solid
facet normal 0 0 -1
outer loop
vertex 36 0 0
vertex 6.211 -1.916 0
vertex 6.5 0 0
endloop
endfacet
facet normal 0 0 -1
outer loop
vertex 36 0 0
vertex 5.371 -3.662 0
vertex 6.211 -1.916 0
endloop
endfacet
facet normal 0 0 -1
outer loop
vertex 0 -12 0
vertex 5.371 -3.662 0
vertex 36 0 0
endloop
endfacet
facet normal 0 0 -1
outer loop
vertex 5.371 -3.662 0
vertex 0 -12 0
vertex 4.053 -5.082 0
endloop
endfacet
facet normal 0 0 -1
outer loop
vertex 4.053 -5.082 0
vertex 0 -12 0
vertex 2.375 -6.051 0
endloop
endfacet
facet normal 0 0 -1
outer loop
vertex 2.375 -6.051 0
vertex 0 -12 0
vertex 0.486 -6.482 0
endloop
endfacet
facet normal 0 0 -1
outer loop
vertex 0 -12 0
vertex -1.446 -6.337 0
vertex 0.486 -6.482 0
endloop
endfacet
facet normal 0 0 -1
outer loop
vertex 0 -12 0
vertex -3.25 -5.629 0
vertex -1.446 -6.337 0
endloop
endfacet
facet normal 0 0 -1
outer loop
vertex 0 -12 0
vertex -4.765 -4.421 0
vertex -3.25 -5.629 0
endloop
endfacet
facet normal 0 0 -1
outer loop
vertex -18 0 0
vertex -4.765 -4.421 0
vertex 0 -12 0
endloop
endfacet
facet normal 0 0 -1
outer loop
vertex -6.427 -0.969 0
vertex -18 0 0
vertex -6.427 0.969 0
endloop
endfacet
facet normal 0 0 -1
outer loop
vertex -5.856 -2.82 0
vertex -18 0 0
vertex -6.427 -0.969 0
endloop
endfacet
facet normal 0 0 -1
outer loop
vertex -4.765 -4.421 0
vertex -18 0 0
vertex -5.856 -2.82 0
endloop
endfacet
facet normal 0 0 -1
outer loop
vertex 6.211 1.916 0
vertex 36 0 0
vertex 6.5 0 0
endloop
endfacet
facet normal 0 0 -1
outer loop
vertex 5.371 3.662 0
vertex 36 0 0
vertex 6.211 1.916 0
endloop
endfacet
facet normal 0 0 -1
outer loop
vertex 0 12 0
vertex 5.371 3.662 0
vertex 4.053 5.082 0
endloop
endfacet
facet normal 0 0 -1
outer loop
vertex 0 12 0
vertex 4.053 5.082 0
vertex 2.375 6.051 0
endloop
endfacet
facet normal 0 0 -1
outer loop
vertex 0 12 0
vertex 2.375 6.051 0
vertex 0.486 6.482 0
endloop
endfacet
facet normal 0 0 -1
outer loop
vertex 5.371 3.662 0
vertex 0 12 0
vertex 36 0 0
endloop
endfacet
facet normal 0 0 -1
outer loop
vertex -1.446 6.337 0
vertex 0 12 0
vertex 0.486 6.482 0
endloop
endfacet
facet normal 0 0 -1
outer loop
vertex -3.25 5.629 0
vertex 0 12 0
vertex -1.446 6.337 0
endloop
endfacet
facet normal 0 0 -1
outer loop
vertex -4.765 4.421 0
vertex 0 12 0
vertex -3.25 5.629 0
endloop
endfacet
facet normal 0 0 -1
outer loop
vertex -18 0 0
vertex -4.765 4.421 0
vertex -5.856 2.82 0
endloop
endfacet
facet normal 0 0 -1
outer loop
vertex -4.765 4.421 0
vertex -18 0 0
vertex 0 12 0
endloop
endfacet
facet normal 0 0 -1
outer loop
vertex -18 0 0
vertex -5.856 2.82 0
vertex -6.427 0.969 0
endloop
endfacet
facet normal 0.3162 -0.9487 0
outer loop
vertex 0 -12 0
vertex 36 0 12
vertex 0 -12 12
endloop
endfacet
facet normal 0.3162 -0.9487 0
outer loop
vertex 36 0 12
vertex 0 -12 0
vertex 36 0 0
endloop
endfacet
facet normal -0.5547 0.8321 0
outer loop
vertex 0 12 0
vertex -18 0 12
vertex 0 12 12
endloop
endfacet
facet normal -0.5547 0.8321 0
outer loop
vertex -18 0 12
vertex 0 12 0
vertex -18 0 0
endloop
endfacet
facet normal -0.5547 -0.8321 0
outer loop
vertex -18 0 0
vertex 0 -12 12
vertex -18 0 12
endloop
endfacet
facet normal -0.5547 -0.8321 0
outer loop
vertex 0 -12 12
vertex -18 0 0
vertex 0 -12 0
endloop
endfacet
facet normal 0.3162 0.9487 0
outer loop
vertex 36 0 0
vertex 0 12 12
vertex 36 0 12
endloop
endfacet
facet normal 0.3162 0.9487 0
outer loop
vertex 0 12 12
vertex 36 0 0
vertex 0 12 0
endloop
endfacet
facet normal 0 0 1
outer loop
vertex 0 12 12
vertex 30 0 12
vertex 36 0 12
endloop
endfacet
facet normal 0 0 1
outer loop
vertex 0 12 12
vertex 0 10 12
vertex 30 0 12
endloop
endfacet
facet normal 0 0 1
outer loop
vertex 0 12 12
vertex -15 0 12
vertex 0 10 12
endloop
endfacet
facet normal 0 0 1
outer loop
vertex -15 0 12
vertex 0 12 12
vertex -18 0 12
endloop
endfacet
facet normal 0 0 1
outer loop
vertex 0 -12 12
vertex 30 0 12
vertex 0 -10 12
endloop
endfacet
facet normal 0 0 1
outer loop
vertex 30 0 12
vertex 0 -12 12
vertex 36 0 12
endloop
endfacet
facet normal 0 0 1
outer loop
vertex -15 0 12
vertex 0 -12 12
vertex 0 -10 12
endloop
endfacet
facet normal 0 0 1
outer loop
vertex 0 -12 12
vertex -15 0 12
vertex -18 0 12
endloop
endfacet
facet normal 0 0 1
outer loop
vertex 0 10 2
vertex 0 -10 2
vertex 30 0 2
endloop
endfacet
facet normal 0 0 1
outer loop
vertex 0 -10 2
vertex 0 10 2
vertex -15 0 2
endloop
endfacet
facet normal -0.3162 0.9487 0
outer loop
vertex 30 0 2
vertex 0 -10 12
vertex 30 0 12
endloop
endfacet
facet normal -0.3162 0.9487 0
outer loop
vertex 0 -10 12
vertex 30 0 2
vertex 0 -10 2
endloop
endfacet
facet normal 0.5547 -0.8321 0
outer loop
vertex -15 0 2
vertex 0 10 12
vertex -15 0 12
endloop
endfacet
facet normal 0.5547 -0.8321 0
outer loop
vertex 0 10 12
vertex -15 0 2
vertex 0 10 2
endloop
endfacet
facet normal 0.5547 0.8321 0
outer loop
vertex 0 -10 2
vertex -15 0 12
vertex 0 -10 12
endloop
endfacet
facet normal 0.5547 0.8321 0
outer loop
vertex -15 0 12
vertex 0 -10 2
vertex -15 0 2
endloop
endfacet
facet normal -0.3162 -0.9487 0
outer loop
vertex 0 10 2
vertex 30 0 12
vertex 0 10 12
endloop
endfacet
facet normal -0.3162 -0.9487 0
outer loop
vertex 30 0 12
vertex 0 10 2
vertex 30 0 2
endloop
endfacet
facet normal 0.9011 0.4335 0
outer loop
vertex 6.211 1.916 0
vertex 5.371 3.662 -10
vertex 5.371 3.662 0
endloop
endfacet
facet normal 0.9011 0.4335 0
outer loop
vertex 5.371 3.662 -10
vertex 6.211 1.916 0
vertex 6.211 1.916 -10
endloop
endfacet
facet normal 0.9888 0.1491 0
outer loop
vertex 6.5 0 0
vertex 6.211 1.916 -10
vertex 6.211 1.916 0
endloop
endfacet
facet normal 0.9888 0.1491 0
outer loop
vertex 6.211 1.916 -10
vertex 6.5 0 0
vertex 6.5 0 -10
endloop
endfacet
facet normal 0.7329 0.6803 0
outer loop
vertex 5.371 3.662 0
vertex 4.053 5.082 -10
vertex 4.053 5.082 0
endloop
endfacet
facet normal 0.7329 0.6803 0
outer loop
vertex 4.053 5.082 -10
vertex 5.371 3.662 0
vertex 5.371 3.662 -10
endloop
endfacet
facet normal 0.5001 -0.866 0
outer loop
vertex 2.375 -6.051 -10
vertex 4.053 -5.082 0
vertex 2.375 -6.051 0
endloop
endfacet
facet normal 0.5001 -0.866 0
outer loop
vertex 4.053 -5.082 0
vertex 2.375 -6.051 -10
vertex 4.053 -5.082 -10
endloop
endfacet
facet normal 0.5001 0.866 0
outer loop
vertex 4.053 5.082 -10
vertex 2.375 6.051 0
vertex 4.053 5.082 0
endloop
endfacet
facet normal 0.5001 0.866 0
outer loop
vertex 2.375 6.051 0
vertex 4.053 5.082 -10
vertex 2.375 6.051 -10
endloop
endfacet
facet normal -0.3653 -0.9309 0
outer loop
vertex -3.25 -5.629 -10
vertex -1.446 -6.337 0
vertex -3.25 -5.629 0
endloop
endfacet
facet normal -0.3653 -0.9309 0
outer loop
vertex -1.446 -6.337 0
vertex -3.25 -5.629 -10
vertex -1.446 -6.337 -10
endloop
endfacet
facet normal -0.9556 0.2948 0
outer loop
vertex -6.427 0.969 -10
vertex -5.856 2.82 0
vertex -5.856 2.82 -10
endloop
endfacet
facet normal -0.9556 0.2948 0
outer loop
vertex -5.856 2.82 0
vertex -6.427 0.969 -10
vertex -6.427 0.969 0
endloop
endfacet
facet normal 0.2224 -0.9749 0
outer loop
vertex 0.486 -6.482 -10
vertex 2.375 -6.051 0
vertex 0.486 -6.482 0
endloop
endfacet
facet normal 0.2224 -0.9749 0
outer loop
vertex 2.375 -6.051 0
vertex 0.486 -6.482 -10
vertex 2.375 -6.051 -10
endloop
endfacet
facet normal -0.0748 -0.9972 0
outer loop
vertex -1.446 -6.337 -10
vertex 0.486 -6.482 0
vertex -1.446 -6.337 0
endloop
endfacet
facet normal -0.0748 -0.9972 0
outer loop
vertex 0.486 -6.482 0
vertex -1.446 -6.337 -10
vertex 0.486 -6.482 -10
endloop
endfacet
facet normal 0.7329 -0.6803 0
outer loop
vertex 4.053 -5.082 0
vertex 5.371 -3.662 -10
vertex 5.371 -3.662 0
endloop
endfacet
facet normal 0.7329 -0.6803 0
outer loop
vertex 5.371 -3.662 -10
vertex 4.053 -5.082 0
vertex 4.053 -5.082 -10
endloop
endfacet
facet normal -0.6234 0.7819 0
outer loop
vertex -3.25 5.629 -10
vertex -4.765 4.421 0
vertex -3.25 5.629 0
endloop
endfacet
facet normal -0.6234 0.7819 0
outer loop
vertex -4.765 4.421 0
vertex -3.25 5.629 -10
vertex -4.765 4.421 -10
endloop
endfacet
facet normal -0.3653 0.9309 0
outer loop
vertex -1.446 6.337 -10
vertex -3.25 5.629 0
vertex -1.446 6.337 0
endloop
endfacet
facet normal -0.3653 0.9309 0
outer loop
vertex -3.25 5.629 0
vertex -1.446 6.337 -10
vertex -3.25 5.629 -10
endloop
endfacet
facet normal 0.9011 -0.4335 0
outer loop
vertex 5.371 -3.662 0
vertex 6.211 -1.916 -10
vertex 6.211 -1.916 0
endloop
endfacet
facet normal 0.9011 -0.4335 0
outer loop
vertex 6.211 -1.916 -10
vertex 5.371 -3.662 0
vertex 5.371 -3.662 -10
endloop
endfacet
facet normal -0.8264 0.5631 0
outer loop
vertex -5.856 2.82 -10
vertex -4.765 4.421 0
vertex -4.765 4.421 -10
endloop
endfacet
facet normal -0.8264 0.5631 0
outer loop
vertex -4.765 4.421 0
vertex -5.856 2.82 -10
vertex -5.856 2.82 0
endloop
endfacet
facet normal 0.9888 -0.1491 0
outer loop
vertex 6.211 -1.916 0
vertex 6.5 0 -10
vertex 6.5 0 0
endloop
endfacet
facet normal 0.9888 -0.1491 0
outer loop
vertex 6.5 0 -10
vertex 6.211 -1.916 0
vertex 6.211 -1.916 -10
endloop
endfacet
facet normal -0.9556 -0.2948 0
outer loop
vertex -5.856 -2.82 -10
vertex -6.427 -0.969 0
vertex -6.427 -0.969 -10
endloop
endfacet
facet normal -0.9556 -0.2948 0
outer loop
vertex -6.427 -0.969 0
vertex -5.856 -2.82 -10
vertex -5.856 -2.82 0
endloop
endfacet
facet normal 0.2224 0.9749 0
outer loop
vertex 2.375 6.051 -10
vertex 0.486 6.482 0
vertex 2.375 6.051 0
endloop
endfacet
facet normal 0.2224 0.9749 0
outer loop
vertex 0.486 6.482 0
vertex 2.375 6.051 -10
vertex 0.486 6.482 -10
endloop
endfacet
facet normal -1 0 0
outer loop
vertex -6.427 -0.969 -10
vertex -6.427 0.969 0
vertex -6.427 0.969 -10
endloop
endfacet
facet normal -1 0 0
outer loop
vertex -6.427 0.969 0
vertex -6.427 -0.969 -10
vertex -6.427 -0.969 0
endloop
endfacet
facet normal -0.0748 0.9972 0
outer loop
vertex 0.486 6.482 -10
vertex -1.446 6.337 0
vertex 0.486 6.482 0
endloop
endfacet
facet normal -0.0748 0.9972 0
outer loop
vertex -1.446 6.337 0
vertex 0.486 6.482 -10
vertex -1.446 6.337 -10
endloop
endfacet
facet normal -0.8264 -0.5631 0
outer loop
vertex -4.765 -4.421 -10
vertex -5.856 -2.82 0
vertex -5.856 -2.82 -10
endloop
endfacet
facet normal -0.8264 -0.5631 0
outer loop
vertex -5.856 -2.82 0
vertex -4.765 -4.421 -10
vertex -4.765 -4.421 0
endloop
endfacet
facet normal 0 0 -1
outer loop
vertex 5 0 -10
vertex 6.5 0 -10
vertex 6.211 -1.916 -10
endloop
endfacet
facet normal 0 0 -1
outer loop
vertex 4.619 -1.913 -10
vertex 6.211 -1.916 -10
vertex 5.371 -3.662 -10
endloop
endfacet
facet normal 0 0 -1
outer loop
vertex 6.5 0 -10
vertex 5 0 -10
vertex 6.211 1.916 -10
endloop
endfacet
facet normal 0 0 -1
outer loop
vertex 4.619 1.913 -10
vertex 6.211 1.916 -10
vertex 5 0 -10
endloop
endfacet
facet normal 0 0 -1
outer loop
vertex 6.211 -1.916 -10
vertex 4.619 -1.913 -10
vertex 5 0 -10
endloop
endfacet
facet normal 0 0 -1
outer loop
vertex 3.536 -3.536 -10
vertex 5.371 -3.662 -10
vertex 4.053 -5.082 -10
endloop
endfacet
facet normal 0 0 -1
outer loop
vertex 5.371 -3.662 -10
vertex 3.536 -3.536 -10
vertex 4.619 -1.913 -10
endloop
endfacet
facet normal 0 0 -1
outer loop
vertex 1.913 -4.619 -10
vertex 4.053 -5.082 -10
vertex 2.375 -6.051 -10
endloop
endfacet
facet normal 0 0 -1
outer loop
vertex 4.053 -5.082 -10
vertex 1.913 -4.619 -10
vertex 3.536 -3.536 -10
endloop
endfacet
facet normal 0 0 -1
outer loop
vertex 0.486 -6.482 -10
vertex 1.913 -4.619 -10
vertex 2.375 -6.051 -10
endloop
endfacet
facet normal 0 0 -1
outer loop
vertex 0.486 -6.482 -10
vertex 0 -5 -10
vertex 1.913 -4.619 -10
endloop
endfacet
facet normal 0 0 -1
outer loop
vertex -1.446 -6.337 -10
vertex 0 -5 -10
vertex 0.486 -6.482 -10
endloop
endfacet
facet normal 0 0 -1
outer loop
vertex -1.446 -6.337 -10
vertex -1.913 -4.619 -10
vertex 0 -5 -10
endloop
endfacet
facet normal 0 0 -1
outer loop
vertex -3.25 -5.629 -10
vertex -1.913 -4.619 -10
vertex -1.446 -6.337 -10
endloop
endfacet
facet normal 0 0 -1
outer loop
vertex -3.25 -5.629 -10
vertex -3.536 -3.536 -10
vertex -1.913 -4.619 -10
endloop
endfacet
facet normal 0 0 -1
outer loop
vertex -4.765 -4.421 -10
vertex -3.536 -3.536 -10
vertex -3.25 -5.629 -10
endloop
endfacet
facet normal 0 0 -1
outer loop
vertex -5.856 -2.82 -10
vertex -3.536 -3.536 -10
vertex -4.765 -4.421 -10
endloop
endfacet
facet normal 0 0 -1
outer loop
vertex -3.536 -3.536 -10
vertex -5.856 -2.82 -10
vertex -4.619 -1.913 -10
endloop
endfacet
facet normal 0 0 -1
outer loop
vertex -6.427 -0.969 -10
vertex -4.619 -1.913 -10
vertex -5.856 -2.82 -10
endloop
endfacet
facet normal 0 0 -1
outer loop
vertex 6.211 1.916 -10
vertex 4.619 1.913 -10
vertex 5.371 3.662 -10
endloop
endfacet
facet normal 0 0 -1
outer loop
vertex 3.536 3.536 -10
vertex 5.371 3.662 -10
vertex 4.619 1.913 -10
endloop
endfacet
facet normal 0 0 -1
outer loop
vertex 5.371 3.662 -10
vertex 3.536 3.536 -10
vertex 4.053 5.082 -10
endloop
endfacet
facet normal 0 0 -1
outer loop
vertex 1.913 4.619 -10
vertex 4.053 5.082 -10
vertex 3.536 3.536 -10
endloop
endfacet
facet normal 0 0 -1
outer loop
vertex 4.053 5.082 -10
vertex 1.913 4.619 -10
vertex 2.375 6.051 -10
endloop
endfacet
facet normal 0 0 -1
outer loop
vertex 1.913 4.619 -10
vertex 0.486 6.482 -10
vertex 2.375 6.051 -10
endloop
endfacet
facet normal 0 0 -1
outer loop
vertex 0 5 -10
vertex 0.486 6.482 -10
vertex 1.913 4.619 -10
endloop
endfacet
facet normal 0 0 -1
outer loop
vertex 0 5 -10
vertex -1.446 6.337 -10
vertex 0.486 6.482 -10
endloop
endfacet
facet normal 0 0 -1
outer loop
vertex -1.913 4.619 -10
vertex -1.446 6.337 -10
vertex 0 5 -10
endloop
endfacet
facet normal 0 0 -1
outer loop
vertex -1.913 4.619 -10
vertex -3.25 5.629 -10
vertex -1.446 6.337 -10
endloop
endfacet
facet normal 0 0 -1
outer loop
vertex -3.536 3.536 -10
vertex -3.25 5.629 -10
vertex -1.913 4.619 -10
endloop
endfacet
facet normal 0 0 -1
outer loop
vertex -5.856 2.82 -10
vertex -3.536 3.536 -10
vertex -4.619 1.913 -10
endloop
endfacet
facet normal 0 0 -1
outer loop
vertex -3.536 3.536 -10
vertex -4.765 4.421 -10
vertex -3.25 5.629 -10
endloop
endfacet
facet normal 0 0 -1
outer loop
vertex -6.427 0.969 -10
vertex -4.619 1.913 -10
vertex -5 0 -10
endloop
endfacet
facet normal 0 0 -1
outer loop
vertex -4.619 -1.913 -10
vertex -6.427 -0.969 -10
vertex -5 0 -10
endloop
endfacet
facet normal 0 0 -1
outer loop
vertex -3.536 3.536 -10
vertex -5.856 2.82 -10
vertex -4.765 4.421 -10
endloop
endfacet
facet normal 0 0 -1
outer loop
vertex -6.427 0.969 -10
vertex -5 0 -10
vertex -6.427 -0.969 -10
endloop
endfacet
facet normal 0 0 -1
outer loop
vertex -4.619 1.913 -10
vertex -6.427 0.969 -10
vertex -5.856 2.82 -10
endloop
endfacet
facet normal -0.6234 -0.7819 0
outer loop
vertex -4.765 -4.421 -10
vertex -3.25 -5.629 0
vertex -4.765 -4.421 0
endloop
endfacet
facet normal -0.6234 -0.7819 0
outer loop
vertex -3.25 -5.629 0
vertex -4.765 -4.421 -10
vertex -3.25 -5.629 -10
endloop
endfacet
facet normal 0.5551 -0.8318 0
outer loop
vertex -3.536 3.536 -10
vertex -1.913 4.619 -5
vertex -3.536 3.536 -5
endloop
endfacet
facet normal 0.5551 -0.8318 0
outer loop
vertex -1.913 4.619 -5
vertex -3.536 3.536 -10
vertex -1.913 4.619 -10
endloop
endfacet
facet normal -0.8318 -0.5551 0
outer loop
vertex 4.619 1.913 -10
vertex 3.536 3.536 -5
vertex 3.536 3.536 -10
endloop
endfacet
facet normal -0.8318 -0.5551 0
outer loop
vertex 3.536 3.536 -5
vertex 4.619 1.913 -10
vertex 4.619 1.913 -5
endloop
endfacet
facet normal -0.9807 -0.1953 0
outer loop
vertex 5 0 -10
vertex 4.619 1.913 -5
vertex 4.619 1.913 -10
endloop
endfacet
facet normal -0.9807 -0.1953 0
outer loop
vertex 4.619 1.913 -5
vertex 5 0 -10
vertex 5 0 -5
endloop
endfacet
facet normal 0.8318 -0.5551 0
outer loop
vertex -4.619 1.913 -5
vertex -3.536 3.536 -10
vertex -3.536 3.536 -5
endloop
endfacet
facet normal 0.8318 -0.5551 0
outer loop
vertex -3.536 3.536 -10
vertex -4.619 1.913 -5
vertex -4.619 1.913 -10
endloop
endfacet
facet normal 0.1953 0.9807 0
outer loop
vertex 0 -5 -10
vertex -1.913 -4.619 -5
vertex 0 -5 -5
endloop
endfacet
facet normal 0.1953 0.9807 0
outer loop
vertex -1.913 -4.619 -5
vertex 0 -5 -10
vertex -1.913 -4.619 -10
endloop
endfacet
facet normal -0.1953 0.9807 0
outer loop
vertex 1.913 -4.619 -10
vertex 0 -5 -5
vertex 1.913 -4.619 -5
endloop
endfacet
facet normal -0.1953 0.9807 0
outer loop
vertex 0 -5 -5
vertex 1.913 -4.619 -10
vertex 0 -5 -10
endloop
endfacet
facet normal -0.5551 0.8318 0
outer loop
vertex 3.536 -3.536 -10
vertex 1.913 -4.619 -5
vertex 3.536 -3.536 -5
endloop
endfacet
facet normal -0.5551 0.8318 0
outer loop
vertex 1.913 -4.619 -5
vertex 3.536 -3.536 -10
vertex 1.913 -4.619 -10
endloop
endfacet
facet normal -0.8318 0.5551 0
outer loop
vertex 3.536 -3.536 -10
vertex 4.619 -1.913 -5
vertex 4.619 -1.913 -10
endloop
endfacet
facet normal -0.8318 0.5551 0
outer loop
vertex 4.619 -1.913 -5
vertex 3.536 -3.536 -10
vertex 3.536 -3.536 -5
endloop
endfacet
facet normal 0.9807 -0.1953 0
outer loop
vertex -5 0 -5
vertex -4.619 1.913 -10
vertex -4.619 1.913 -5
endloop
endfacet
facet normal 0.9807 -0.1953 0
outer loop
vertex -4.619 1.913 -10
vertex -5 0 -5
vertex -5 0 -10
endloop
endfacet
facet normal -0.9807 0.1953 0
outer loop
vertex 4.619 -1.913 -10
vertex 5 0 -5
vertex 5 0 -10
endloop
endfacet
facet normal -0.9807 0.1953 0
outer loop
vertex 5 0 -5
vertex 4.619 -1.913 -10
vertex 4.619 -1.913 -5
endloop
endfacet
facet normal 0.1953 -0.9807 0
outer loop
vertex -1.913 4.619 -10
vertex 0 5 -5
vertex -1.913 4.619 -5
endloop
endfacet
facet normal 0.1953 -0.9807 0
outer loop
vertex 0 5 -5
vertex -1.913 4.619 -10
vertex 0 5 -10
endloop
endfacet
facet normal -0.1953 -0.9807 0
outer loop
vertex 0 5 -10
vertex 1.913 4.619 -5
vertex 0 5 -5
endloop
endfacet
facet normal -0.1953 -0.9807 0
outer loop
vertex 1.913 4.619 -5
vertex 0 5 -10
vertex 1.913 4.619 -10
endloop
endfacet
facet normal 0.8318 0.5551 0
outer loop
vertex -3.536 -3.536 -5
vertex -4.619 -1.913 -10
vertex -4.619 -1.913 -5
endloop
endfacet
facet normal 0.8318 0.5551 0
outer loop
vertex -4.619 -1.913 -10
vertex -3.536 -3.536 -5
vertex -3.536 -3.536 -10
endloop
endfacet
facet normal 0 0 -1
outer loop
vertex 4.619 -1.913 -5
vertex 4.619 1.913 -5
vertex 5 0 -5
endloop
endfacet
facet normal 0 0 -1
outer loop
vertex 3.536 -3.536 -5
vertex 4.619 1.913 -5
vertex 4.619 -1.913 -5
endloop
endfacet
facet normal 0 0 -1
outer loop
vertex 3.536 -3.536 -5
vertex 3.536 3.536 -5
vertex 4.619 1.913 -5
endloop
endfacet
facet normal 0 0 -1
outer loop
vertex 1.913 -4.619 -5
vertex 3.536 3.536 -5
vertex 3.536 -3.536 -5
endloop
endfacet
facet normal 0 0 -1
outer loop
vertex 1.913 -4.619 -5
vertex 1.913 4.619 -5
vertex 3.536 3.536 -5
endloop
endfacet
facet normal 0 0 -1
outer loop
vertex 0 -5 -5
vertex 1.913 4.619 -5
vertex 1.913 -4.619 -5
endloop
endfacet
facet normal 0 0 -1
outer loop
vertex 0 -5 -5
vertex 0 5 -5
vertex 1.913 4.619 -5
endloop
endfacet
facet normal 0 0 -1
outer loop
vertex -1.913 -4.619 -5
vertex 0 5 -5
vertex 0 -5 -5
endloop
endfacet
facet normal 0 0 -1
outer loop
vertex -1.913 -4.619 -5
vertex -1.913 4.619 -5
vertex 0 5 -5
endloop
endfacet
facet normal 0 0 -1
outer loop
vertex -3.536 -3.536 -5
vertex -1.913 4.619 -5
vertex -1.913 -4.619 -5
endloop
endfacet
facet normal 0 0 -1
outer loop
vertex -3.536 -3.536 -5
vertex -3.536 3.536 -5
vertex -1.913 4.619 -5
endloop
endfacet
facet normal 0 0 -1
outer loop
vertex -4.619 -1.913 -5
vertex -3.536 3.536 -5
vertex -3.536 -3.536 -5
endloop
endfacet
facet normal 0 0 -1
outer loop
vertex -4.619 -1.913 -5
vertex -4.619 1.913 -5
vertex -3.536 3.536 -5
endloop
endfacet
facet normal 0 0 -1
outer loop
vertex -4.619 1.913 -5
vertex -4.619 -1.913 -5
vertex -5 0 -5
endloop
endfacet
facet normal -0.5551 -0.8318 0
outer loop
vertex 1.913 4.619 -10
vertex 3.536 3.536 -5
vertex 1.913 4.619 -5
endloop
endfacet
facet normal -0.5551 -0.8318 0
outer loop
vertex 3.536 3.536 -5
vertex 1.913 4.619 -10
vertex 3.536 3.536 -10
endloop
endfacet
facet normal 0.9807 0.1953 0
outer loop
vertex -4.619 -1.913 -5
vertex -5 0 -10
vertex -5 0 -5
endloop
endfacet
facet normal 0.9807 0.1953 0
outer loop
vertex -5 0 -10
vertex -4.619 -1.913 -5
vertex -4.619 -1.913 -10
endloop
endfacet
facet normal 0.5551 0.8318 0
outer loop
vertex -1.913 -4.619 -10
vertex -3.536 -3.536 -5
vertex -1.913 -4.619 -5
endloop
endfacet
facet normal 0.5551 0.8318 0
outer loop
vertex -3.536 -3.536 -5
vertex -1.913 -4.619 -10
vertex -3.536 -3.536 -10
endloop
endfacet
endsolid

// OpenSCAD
servo_axle_height = 5;
servo_axle_diam = 10;

screw_cap_height = 3;
screw_cap_diam = 6;
screw_shank_diam = 3;

axle_diam = 13;
axle_height = servo_axle_height + screw_cap_height + 2;

deadbolt_short_len = 15;
deadbolt_long_len = 30;
deadbolt_width = 10;
deadbolt_height = 10;

thick_mult = 1.2;


difference()
{
  // Outer shell of deadbolt actuator, includes cap
  linear_extrude(height = deadbolt_height * thick_mult, convexity = 10, twist = 0)
    polygon(points = [[0, deadbolt_width * thick_mult], [(deadbolt_long_len * thick_mult), 0], [0, (-1 * (deadbolt_width * thick_mult))], [(-1 * (deadbolt_short_len * thick_mult)), 0]], paths = [[0, 1, 2, 3, 0]]);

  // Remove inner shell of deadbolt actuator
  translate([0, 0, (deadbolt_height * thick_mult) - deadbolt_height])
  linear_extrude(height = deadbolt_height, convexity = 10, twist = 0)
    polygon(points = [[0, deadbolt_width], [deadbolt_long_len, 0], [0, (-1 * deadbolt_width)], [-1 * deadbolt_short_len, 0]], paths = [[0, 1, 2, 3, 0]]);
  // Cylinder for screw cap to fit into
  translate([0, 0, (axle_height - screw_cap_height)])
    cylinder(h = screw_cap_height, r = (screw_cap_diam / 2));
}

difference()
{
  translate([0, 0, (-1 * axle_height)])
  // Main axle cylinder
  cylinder(h = axle_height, r = (axle_diam / 2));
 translate([0, 0, (-1 * axle_height)])
  // Cylinder where the servo axle will fit
  cylinder(h = servo_axle_height, r = (servo_axle_diam / 2));
  // Cylinder fr the screw shank to fit into
  cylinder(h = axle_height, r = (screw_shank_diam / 2));
}
